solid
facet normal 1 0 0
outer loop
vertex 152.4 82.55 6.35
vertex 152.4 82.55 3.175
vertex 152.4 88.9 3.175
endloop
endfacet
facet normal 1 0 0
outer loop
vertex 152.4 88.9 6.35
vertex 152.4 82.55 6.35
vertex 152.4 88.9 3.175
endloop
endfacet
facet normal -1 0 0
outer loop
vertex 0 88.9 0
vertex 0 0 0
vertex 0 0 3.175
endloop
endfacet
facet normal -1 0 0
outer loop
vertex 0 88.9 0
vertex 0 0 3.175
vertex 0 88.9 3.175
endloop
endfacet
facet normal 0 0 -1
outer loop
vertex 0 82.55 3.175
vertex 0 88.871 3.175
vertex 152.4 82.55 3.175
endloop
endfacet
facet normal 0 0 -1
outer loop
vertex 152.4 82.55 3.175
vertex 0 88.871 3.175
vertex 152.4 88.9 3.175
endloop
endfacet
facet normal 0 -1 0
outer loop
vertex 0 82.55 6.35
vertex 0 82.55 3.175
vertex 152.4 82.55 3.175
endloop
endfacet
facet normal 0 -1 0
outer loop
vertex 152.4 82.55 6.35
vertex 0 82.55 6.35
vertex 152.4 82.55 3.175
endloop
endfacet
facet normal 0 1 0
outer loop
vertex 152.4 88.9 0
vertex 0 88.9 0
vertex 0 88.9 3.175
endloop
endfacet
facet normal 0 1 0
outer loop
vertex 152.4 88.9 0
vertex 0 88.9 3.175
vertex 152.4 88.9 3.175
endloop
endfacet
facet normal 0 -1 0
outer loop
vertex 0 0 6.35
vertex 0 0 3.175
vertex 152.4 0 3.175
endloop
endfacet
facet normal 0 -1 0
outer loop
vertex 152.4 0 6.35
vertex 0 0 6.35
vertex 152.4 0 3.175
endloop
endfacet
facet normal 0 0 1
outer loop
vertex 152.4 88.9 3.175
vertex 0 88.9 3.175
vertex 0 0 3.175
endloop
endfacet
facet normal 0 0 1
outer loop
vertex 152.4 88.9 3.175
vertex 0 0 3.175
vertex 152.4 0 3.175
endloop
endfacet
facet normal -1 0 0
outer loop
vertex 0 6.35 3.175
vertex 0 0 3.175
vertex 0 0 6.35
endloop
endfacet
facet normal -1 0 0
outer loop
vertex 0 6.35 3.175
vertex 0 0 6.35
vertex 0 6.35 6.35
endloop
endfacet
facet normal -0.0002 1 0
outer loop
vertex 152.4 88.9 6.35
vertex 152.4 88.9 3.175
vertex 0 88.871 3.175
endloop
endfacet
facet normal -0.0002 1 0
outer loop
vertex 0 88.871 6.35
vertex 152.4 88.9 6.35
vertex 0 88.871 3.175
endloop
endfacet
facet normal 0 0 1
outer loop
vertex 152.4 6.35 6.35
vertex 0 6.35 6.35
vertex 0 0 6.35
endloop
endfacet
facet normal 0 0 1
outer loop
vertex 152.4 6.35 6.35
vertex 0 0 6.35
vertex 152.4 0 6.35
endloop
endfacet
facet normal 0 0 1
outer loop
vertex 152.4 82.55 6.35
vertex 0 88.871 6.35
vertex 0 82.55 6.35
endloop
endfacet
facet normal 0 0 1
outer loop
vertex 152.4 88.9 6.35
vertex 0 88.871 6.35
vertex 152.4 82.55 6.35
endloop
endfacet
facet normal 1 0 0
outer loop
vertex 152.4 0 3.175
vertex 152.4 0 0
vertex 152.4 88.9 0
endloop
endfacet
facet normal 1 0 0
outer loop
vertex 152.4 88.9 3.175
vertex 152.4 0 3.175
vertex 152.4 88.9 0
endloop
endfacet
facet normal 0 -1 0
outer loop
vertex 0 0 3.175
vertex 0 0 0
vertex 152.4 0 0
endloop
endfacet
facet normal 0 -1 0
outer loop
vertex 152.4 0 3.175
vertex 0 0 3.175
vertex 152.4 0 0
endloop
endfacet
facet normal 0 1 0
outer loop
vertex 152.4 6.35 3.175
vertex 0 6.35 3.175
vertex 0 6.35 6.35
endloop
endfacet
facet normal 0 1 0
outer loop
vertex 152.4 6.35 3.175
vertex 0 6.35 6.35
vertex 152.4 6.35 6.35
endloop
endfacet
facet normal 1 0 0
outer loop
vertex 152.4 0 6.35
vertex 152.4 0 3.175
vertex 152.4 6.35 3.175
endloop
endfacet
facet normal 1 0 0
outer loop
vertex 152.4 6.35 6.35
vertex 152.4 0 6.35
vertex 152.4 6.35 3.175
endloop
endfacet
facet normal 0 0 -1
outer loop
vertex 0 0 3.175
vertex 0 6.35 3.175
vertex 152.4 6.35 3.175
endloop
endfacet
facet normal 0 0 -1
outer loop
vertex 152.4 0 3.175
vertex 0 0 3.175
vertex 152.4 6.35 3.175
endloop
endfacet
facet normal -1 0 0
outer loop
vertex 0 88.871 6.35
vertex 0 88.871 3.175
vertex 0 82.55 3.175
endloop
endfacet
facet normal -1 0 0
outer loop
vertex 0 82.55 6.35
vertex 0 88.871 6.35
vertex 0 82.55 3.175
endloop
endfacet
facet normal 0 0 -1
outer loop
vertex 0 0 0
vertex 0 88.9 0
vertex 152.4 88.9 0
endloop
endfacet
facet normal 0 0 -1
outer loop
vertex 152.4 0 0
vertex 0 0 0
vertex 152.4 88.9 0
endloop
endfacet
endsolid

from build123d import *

# Parameters (mm, degrees)
F0_W     = 152.4
F0_H     = 88.9
F1_DEPTH = 3.175
F2_W     = 152.4
F2_H     = 6.35
F4_DEPTH = 3.175
F5_DEPTH = 3.175


with BuildPart() as f1:
    # F0 (on Top) → F1 (new body)
    with BuildSketch(Plane.XY):
        with Locations((76.2, 44.45)):
            Rectangle(F0_W, F0_H)
    extrude(amount=F1_DEPTH)


with BuildPart() as f4:
    # F2 (on face) → F4 (new body)
    with BuildSketch(Plane.XY.offset(3.175)):
        with Locations((76.2, 3.175)):
            Rectangle(F2_W, F2_H)
    extrude(amount=F4_DEPTH)


with BuildPart() as f5:
    # F3 (on face) → F5 (new body)
    with BuildSketch(Plane.XY.offset(3.175)):
        Polygon((0, 82.55), (152.4, 82.55), (152.4, 88.9), (0, 88.870898), align=None)
    extrude(amount=F5_DEPTH)


solid = Compound([f1.part, f4.part, f5.part])
